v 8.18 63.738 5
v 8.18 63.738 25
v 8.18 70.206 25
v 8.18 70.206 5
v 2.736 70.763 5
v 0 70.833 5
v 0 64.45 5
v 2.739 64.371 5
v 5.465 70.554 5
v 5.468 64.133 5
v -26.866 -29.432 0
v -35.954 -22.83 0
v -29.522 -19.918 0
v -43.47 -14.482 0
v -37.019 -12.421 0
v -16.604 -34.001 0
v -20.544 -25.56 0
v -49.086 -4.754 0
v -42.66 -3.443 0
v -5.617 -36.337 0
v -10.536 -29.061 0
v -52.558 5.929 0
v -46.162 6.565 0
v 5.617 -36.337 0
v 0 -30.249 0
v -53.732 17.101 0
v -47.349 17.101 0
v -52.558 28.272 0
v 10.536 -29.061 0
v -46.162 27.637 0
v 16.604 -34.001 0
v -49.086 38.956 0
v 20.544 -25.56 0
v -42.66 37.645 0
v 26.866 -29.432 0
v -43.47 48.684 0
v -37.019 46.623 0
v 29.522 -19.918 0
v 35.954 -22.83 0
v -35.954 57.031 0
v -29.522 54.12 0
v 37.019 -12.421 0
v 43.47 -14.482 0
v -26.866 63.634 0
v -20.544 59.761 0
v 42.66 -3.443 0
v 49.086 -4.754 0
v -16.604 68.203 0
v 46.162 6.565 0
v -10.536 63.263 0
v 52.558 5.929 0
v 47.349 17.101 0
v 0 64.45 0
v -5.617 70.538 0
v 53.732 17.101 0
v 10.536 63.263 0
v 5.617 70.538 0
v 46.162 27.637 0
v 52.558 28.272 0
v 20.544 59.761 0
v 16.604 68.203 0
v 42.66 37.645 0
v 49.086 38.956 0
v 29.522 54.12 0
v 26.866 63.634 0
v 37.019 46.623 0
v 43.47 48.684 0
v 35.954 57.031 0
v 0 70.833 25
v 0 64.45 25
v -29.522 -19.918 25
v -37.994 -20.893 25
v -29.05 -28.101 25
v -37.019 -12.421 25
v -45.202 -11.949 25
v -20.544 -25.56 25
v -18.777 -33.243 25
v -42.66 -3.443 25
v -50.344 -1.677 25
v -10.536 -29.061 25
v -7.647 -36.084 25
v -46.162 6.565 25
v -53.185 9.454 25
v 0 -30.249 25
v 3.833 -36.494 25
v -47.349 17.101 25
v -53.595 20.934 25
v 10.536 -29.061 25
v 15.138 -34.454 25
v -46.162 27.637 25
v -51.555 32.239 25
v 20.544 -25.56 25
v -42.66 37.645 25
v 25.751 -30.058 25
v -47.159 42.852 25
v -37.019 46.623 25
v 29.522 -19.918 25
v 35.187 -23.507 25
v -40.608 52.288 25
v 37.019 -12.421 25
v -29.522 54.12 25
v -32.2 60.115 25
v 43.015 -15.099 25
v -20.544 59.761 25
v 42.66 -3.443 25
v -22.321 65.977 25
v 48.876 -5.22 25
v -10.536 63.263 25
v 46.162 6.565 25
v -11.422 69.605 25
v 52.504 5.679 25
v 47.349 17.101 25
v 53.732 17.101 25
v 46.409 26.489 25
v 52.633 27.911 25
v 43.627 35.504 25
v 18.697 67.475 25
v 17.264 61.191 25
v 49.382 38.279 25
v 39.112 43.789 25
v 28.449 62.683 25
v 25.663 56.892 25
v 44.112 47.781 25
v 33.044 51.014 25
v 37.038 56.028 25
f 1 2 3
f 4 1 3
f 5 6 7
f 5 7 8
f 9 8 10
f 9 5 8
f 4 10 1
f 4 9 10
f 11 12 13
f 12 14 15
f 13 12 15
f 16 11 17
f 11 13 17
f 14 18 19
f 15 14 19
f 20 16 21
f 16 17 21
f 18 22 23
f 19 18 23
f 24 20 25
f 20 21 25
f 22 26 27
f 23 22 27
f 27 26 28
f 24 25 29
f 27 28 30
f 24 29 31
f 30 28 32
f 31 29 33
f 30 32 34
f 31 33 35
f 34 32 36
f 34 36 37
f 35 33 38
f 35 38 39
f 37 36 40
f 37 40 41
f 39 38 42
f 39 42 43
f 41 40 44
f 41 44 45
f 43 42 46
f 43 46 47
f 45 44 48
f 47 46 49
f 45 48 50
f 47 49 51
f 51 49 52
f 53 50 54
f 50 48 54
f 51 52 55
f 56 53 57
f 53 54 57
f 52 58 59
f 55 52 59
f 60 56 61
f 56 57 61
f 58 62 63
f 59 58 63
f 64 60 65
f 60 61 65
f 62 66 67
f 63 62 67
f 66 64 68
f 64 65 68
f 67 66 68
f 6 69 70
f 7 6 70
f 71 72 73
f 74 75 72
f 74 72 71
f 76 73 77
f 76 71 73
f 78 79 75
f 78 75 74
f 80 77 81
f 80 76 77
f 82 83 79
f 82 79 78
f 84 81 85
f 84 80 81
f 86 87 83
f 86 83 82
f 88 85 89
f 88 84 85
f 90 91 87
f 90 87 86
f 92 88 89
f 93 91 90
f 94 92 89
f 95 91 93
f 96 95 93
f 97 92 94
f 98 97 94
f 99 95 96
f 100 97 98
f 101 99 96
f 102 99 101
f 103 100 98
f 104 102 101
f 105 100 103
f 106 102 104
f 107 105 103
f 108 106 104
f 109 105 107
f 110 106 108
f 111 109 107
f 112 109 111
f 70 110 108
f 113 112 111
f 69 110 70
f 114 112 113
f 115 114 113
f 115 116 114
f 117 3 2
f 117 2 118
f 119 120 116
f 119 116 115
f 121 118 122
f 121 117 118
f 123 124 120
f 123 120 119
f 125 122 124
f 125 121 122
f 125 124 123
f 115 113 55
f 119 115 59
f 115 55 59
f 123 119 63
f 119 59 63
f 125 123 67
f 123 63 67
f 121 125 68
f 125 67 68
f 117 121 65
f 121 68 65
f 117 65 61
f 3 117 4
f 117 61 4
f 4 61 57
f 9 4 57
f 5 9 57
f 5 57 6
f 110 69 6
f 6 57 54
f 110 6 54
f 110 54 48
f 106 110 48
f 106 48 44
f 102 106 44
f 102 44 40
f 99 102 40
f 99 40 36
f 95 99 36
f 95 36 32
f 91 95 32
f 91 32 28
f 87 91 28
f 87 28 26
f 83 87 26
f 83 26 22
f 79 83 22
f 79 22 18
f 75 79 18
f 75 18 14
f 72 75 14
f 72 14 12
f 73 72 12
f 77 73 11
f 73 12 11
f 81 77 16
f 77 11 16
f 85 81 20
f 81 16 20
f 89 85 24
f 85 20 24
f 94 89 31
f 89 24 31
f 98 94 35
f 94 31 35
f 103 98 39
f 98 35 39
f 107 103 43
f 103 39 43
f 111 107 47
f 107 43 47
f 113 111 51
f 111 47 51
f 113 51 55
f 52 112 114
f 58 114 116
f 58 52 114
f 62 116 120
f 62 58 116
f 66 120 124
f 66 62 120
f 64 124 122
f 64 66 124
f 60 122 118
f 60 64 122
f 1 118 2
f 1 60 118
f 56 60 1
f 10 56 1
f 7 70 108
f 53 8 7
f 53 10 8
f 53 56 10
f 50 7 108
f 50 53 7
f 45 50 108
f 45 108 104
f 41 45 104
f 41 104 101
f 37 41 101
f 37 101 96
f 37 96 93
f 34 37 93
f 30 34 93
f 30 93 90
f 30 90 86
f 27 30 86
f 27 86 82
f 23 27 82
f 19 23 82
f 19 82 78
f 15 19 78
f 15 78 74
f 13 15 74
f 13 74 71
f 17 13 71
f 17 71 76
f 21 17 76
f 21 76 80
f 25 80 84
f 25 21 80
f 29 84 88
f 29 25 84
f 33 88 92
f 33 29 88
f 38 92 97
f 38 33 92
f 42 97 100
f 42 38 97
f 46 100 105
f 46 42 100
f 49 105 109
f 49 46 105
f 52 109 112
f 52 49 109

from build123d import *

# Parameters (mm, degrees)
F0_R     = 53.731796632
F0_R_2   = 47.3494506103
F1_DEPTH = 25
F3_DEPTH = 20


with BuildPart() as f1:
    # F0 (on Top) → F1 (new body)
    with BuildSketch(Plane.XY):
        with Locations((0, 17.1008221805)):
            Circle(F0_R)
        with Locations((0, 17.1008221805)):
            Circle(F0_R_2, mode=Mode.SUBTRACT)
    extrude(amount=F1_DEPTH)

    # F2 (on face) → F3 (cut)
    with BuildSketch(Plane.XY.offset(25)):
        with BuildLine():
            Line((0, 70.8326188125), (0, 64.4502727909))
            ThreePointArc((0, 64.4502727909), (4.1053363789, 64.2719646971), (8.1797530875, 63.7383833574))
            Line((8.1797530875, 63.7383833574), (8.1797530875, 70.2063549312))
            ThreePointArc((8.1797530875, 70.2063549312), (4.1018461399, 70.6758240708), (0, 70.8326188125))
        make_face()
    extrude(amount=-F3_DEPTH, mode=Mode.SUBTRACT)


solid = f1.part
